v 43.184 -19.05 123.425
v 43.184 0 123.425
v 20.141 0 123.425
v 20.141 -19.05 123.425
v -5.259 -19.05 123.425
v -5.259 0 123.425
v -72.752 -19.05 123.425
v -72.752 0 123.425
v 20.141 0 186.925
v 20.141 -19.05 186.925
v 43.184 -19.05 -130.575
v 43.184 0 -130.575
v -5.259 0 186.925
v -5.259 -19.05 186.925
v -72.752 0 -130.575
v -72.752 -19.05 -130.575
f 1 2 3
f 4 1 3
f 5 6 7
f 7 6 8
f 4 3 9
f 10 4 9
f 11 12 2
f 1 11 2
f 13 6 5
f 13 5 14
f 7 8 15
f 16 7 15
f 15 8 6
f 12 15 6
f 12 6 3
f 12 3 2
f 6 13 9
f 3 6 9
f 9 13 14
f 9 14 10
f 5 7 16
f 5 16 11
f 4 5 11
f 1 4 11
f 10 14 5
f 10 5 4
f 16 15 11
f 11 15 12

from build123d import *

# Parameters (mm, degrees)
F0_W     = 25.4
F0_H     = 63.5
F1_DEPTH = 19.05


with BuildPart() as f1:
    # F0 (on Front) → F1 (new body)
    with BuildSketch(Plane.XZ):
        Polygon((-53.701798, 123.424824), (-72.751798, 123.424824), (-72.751798, -130.575176), (-34.651798, -130.575176), (43.184318, -130.575176), (43.184318, 123.424824), (20.14126, 123.424824), (-5.25874, 123.424824), (-34.651798, 123.424824), align=None)
        with Locations((7.44126, 155.174824)):
            Rectangle(F0_W, F0_H)
    extrude(amount=F1_DEPTH)


solid = f1.part
